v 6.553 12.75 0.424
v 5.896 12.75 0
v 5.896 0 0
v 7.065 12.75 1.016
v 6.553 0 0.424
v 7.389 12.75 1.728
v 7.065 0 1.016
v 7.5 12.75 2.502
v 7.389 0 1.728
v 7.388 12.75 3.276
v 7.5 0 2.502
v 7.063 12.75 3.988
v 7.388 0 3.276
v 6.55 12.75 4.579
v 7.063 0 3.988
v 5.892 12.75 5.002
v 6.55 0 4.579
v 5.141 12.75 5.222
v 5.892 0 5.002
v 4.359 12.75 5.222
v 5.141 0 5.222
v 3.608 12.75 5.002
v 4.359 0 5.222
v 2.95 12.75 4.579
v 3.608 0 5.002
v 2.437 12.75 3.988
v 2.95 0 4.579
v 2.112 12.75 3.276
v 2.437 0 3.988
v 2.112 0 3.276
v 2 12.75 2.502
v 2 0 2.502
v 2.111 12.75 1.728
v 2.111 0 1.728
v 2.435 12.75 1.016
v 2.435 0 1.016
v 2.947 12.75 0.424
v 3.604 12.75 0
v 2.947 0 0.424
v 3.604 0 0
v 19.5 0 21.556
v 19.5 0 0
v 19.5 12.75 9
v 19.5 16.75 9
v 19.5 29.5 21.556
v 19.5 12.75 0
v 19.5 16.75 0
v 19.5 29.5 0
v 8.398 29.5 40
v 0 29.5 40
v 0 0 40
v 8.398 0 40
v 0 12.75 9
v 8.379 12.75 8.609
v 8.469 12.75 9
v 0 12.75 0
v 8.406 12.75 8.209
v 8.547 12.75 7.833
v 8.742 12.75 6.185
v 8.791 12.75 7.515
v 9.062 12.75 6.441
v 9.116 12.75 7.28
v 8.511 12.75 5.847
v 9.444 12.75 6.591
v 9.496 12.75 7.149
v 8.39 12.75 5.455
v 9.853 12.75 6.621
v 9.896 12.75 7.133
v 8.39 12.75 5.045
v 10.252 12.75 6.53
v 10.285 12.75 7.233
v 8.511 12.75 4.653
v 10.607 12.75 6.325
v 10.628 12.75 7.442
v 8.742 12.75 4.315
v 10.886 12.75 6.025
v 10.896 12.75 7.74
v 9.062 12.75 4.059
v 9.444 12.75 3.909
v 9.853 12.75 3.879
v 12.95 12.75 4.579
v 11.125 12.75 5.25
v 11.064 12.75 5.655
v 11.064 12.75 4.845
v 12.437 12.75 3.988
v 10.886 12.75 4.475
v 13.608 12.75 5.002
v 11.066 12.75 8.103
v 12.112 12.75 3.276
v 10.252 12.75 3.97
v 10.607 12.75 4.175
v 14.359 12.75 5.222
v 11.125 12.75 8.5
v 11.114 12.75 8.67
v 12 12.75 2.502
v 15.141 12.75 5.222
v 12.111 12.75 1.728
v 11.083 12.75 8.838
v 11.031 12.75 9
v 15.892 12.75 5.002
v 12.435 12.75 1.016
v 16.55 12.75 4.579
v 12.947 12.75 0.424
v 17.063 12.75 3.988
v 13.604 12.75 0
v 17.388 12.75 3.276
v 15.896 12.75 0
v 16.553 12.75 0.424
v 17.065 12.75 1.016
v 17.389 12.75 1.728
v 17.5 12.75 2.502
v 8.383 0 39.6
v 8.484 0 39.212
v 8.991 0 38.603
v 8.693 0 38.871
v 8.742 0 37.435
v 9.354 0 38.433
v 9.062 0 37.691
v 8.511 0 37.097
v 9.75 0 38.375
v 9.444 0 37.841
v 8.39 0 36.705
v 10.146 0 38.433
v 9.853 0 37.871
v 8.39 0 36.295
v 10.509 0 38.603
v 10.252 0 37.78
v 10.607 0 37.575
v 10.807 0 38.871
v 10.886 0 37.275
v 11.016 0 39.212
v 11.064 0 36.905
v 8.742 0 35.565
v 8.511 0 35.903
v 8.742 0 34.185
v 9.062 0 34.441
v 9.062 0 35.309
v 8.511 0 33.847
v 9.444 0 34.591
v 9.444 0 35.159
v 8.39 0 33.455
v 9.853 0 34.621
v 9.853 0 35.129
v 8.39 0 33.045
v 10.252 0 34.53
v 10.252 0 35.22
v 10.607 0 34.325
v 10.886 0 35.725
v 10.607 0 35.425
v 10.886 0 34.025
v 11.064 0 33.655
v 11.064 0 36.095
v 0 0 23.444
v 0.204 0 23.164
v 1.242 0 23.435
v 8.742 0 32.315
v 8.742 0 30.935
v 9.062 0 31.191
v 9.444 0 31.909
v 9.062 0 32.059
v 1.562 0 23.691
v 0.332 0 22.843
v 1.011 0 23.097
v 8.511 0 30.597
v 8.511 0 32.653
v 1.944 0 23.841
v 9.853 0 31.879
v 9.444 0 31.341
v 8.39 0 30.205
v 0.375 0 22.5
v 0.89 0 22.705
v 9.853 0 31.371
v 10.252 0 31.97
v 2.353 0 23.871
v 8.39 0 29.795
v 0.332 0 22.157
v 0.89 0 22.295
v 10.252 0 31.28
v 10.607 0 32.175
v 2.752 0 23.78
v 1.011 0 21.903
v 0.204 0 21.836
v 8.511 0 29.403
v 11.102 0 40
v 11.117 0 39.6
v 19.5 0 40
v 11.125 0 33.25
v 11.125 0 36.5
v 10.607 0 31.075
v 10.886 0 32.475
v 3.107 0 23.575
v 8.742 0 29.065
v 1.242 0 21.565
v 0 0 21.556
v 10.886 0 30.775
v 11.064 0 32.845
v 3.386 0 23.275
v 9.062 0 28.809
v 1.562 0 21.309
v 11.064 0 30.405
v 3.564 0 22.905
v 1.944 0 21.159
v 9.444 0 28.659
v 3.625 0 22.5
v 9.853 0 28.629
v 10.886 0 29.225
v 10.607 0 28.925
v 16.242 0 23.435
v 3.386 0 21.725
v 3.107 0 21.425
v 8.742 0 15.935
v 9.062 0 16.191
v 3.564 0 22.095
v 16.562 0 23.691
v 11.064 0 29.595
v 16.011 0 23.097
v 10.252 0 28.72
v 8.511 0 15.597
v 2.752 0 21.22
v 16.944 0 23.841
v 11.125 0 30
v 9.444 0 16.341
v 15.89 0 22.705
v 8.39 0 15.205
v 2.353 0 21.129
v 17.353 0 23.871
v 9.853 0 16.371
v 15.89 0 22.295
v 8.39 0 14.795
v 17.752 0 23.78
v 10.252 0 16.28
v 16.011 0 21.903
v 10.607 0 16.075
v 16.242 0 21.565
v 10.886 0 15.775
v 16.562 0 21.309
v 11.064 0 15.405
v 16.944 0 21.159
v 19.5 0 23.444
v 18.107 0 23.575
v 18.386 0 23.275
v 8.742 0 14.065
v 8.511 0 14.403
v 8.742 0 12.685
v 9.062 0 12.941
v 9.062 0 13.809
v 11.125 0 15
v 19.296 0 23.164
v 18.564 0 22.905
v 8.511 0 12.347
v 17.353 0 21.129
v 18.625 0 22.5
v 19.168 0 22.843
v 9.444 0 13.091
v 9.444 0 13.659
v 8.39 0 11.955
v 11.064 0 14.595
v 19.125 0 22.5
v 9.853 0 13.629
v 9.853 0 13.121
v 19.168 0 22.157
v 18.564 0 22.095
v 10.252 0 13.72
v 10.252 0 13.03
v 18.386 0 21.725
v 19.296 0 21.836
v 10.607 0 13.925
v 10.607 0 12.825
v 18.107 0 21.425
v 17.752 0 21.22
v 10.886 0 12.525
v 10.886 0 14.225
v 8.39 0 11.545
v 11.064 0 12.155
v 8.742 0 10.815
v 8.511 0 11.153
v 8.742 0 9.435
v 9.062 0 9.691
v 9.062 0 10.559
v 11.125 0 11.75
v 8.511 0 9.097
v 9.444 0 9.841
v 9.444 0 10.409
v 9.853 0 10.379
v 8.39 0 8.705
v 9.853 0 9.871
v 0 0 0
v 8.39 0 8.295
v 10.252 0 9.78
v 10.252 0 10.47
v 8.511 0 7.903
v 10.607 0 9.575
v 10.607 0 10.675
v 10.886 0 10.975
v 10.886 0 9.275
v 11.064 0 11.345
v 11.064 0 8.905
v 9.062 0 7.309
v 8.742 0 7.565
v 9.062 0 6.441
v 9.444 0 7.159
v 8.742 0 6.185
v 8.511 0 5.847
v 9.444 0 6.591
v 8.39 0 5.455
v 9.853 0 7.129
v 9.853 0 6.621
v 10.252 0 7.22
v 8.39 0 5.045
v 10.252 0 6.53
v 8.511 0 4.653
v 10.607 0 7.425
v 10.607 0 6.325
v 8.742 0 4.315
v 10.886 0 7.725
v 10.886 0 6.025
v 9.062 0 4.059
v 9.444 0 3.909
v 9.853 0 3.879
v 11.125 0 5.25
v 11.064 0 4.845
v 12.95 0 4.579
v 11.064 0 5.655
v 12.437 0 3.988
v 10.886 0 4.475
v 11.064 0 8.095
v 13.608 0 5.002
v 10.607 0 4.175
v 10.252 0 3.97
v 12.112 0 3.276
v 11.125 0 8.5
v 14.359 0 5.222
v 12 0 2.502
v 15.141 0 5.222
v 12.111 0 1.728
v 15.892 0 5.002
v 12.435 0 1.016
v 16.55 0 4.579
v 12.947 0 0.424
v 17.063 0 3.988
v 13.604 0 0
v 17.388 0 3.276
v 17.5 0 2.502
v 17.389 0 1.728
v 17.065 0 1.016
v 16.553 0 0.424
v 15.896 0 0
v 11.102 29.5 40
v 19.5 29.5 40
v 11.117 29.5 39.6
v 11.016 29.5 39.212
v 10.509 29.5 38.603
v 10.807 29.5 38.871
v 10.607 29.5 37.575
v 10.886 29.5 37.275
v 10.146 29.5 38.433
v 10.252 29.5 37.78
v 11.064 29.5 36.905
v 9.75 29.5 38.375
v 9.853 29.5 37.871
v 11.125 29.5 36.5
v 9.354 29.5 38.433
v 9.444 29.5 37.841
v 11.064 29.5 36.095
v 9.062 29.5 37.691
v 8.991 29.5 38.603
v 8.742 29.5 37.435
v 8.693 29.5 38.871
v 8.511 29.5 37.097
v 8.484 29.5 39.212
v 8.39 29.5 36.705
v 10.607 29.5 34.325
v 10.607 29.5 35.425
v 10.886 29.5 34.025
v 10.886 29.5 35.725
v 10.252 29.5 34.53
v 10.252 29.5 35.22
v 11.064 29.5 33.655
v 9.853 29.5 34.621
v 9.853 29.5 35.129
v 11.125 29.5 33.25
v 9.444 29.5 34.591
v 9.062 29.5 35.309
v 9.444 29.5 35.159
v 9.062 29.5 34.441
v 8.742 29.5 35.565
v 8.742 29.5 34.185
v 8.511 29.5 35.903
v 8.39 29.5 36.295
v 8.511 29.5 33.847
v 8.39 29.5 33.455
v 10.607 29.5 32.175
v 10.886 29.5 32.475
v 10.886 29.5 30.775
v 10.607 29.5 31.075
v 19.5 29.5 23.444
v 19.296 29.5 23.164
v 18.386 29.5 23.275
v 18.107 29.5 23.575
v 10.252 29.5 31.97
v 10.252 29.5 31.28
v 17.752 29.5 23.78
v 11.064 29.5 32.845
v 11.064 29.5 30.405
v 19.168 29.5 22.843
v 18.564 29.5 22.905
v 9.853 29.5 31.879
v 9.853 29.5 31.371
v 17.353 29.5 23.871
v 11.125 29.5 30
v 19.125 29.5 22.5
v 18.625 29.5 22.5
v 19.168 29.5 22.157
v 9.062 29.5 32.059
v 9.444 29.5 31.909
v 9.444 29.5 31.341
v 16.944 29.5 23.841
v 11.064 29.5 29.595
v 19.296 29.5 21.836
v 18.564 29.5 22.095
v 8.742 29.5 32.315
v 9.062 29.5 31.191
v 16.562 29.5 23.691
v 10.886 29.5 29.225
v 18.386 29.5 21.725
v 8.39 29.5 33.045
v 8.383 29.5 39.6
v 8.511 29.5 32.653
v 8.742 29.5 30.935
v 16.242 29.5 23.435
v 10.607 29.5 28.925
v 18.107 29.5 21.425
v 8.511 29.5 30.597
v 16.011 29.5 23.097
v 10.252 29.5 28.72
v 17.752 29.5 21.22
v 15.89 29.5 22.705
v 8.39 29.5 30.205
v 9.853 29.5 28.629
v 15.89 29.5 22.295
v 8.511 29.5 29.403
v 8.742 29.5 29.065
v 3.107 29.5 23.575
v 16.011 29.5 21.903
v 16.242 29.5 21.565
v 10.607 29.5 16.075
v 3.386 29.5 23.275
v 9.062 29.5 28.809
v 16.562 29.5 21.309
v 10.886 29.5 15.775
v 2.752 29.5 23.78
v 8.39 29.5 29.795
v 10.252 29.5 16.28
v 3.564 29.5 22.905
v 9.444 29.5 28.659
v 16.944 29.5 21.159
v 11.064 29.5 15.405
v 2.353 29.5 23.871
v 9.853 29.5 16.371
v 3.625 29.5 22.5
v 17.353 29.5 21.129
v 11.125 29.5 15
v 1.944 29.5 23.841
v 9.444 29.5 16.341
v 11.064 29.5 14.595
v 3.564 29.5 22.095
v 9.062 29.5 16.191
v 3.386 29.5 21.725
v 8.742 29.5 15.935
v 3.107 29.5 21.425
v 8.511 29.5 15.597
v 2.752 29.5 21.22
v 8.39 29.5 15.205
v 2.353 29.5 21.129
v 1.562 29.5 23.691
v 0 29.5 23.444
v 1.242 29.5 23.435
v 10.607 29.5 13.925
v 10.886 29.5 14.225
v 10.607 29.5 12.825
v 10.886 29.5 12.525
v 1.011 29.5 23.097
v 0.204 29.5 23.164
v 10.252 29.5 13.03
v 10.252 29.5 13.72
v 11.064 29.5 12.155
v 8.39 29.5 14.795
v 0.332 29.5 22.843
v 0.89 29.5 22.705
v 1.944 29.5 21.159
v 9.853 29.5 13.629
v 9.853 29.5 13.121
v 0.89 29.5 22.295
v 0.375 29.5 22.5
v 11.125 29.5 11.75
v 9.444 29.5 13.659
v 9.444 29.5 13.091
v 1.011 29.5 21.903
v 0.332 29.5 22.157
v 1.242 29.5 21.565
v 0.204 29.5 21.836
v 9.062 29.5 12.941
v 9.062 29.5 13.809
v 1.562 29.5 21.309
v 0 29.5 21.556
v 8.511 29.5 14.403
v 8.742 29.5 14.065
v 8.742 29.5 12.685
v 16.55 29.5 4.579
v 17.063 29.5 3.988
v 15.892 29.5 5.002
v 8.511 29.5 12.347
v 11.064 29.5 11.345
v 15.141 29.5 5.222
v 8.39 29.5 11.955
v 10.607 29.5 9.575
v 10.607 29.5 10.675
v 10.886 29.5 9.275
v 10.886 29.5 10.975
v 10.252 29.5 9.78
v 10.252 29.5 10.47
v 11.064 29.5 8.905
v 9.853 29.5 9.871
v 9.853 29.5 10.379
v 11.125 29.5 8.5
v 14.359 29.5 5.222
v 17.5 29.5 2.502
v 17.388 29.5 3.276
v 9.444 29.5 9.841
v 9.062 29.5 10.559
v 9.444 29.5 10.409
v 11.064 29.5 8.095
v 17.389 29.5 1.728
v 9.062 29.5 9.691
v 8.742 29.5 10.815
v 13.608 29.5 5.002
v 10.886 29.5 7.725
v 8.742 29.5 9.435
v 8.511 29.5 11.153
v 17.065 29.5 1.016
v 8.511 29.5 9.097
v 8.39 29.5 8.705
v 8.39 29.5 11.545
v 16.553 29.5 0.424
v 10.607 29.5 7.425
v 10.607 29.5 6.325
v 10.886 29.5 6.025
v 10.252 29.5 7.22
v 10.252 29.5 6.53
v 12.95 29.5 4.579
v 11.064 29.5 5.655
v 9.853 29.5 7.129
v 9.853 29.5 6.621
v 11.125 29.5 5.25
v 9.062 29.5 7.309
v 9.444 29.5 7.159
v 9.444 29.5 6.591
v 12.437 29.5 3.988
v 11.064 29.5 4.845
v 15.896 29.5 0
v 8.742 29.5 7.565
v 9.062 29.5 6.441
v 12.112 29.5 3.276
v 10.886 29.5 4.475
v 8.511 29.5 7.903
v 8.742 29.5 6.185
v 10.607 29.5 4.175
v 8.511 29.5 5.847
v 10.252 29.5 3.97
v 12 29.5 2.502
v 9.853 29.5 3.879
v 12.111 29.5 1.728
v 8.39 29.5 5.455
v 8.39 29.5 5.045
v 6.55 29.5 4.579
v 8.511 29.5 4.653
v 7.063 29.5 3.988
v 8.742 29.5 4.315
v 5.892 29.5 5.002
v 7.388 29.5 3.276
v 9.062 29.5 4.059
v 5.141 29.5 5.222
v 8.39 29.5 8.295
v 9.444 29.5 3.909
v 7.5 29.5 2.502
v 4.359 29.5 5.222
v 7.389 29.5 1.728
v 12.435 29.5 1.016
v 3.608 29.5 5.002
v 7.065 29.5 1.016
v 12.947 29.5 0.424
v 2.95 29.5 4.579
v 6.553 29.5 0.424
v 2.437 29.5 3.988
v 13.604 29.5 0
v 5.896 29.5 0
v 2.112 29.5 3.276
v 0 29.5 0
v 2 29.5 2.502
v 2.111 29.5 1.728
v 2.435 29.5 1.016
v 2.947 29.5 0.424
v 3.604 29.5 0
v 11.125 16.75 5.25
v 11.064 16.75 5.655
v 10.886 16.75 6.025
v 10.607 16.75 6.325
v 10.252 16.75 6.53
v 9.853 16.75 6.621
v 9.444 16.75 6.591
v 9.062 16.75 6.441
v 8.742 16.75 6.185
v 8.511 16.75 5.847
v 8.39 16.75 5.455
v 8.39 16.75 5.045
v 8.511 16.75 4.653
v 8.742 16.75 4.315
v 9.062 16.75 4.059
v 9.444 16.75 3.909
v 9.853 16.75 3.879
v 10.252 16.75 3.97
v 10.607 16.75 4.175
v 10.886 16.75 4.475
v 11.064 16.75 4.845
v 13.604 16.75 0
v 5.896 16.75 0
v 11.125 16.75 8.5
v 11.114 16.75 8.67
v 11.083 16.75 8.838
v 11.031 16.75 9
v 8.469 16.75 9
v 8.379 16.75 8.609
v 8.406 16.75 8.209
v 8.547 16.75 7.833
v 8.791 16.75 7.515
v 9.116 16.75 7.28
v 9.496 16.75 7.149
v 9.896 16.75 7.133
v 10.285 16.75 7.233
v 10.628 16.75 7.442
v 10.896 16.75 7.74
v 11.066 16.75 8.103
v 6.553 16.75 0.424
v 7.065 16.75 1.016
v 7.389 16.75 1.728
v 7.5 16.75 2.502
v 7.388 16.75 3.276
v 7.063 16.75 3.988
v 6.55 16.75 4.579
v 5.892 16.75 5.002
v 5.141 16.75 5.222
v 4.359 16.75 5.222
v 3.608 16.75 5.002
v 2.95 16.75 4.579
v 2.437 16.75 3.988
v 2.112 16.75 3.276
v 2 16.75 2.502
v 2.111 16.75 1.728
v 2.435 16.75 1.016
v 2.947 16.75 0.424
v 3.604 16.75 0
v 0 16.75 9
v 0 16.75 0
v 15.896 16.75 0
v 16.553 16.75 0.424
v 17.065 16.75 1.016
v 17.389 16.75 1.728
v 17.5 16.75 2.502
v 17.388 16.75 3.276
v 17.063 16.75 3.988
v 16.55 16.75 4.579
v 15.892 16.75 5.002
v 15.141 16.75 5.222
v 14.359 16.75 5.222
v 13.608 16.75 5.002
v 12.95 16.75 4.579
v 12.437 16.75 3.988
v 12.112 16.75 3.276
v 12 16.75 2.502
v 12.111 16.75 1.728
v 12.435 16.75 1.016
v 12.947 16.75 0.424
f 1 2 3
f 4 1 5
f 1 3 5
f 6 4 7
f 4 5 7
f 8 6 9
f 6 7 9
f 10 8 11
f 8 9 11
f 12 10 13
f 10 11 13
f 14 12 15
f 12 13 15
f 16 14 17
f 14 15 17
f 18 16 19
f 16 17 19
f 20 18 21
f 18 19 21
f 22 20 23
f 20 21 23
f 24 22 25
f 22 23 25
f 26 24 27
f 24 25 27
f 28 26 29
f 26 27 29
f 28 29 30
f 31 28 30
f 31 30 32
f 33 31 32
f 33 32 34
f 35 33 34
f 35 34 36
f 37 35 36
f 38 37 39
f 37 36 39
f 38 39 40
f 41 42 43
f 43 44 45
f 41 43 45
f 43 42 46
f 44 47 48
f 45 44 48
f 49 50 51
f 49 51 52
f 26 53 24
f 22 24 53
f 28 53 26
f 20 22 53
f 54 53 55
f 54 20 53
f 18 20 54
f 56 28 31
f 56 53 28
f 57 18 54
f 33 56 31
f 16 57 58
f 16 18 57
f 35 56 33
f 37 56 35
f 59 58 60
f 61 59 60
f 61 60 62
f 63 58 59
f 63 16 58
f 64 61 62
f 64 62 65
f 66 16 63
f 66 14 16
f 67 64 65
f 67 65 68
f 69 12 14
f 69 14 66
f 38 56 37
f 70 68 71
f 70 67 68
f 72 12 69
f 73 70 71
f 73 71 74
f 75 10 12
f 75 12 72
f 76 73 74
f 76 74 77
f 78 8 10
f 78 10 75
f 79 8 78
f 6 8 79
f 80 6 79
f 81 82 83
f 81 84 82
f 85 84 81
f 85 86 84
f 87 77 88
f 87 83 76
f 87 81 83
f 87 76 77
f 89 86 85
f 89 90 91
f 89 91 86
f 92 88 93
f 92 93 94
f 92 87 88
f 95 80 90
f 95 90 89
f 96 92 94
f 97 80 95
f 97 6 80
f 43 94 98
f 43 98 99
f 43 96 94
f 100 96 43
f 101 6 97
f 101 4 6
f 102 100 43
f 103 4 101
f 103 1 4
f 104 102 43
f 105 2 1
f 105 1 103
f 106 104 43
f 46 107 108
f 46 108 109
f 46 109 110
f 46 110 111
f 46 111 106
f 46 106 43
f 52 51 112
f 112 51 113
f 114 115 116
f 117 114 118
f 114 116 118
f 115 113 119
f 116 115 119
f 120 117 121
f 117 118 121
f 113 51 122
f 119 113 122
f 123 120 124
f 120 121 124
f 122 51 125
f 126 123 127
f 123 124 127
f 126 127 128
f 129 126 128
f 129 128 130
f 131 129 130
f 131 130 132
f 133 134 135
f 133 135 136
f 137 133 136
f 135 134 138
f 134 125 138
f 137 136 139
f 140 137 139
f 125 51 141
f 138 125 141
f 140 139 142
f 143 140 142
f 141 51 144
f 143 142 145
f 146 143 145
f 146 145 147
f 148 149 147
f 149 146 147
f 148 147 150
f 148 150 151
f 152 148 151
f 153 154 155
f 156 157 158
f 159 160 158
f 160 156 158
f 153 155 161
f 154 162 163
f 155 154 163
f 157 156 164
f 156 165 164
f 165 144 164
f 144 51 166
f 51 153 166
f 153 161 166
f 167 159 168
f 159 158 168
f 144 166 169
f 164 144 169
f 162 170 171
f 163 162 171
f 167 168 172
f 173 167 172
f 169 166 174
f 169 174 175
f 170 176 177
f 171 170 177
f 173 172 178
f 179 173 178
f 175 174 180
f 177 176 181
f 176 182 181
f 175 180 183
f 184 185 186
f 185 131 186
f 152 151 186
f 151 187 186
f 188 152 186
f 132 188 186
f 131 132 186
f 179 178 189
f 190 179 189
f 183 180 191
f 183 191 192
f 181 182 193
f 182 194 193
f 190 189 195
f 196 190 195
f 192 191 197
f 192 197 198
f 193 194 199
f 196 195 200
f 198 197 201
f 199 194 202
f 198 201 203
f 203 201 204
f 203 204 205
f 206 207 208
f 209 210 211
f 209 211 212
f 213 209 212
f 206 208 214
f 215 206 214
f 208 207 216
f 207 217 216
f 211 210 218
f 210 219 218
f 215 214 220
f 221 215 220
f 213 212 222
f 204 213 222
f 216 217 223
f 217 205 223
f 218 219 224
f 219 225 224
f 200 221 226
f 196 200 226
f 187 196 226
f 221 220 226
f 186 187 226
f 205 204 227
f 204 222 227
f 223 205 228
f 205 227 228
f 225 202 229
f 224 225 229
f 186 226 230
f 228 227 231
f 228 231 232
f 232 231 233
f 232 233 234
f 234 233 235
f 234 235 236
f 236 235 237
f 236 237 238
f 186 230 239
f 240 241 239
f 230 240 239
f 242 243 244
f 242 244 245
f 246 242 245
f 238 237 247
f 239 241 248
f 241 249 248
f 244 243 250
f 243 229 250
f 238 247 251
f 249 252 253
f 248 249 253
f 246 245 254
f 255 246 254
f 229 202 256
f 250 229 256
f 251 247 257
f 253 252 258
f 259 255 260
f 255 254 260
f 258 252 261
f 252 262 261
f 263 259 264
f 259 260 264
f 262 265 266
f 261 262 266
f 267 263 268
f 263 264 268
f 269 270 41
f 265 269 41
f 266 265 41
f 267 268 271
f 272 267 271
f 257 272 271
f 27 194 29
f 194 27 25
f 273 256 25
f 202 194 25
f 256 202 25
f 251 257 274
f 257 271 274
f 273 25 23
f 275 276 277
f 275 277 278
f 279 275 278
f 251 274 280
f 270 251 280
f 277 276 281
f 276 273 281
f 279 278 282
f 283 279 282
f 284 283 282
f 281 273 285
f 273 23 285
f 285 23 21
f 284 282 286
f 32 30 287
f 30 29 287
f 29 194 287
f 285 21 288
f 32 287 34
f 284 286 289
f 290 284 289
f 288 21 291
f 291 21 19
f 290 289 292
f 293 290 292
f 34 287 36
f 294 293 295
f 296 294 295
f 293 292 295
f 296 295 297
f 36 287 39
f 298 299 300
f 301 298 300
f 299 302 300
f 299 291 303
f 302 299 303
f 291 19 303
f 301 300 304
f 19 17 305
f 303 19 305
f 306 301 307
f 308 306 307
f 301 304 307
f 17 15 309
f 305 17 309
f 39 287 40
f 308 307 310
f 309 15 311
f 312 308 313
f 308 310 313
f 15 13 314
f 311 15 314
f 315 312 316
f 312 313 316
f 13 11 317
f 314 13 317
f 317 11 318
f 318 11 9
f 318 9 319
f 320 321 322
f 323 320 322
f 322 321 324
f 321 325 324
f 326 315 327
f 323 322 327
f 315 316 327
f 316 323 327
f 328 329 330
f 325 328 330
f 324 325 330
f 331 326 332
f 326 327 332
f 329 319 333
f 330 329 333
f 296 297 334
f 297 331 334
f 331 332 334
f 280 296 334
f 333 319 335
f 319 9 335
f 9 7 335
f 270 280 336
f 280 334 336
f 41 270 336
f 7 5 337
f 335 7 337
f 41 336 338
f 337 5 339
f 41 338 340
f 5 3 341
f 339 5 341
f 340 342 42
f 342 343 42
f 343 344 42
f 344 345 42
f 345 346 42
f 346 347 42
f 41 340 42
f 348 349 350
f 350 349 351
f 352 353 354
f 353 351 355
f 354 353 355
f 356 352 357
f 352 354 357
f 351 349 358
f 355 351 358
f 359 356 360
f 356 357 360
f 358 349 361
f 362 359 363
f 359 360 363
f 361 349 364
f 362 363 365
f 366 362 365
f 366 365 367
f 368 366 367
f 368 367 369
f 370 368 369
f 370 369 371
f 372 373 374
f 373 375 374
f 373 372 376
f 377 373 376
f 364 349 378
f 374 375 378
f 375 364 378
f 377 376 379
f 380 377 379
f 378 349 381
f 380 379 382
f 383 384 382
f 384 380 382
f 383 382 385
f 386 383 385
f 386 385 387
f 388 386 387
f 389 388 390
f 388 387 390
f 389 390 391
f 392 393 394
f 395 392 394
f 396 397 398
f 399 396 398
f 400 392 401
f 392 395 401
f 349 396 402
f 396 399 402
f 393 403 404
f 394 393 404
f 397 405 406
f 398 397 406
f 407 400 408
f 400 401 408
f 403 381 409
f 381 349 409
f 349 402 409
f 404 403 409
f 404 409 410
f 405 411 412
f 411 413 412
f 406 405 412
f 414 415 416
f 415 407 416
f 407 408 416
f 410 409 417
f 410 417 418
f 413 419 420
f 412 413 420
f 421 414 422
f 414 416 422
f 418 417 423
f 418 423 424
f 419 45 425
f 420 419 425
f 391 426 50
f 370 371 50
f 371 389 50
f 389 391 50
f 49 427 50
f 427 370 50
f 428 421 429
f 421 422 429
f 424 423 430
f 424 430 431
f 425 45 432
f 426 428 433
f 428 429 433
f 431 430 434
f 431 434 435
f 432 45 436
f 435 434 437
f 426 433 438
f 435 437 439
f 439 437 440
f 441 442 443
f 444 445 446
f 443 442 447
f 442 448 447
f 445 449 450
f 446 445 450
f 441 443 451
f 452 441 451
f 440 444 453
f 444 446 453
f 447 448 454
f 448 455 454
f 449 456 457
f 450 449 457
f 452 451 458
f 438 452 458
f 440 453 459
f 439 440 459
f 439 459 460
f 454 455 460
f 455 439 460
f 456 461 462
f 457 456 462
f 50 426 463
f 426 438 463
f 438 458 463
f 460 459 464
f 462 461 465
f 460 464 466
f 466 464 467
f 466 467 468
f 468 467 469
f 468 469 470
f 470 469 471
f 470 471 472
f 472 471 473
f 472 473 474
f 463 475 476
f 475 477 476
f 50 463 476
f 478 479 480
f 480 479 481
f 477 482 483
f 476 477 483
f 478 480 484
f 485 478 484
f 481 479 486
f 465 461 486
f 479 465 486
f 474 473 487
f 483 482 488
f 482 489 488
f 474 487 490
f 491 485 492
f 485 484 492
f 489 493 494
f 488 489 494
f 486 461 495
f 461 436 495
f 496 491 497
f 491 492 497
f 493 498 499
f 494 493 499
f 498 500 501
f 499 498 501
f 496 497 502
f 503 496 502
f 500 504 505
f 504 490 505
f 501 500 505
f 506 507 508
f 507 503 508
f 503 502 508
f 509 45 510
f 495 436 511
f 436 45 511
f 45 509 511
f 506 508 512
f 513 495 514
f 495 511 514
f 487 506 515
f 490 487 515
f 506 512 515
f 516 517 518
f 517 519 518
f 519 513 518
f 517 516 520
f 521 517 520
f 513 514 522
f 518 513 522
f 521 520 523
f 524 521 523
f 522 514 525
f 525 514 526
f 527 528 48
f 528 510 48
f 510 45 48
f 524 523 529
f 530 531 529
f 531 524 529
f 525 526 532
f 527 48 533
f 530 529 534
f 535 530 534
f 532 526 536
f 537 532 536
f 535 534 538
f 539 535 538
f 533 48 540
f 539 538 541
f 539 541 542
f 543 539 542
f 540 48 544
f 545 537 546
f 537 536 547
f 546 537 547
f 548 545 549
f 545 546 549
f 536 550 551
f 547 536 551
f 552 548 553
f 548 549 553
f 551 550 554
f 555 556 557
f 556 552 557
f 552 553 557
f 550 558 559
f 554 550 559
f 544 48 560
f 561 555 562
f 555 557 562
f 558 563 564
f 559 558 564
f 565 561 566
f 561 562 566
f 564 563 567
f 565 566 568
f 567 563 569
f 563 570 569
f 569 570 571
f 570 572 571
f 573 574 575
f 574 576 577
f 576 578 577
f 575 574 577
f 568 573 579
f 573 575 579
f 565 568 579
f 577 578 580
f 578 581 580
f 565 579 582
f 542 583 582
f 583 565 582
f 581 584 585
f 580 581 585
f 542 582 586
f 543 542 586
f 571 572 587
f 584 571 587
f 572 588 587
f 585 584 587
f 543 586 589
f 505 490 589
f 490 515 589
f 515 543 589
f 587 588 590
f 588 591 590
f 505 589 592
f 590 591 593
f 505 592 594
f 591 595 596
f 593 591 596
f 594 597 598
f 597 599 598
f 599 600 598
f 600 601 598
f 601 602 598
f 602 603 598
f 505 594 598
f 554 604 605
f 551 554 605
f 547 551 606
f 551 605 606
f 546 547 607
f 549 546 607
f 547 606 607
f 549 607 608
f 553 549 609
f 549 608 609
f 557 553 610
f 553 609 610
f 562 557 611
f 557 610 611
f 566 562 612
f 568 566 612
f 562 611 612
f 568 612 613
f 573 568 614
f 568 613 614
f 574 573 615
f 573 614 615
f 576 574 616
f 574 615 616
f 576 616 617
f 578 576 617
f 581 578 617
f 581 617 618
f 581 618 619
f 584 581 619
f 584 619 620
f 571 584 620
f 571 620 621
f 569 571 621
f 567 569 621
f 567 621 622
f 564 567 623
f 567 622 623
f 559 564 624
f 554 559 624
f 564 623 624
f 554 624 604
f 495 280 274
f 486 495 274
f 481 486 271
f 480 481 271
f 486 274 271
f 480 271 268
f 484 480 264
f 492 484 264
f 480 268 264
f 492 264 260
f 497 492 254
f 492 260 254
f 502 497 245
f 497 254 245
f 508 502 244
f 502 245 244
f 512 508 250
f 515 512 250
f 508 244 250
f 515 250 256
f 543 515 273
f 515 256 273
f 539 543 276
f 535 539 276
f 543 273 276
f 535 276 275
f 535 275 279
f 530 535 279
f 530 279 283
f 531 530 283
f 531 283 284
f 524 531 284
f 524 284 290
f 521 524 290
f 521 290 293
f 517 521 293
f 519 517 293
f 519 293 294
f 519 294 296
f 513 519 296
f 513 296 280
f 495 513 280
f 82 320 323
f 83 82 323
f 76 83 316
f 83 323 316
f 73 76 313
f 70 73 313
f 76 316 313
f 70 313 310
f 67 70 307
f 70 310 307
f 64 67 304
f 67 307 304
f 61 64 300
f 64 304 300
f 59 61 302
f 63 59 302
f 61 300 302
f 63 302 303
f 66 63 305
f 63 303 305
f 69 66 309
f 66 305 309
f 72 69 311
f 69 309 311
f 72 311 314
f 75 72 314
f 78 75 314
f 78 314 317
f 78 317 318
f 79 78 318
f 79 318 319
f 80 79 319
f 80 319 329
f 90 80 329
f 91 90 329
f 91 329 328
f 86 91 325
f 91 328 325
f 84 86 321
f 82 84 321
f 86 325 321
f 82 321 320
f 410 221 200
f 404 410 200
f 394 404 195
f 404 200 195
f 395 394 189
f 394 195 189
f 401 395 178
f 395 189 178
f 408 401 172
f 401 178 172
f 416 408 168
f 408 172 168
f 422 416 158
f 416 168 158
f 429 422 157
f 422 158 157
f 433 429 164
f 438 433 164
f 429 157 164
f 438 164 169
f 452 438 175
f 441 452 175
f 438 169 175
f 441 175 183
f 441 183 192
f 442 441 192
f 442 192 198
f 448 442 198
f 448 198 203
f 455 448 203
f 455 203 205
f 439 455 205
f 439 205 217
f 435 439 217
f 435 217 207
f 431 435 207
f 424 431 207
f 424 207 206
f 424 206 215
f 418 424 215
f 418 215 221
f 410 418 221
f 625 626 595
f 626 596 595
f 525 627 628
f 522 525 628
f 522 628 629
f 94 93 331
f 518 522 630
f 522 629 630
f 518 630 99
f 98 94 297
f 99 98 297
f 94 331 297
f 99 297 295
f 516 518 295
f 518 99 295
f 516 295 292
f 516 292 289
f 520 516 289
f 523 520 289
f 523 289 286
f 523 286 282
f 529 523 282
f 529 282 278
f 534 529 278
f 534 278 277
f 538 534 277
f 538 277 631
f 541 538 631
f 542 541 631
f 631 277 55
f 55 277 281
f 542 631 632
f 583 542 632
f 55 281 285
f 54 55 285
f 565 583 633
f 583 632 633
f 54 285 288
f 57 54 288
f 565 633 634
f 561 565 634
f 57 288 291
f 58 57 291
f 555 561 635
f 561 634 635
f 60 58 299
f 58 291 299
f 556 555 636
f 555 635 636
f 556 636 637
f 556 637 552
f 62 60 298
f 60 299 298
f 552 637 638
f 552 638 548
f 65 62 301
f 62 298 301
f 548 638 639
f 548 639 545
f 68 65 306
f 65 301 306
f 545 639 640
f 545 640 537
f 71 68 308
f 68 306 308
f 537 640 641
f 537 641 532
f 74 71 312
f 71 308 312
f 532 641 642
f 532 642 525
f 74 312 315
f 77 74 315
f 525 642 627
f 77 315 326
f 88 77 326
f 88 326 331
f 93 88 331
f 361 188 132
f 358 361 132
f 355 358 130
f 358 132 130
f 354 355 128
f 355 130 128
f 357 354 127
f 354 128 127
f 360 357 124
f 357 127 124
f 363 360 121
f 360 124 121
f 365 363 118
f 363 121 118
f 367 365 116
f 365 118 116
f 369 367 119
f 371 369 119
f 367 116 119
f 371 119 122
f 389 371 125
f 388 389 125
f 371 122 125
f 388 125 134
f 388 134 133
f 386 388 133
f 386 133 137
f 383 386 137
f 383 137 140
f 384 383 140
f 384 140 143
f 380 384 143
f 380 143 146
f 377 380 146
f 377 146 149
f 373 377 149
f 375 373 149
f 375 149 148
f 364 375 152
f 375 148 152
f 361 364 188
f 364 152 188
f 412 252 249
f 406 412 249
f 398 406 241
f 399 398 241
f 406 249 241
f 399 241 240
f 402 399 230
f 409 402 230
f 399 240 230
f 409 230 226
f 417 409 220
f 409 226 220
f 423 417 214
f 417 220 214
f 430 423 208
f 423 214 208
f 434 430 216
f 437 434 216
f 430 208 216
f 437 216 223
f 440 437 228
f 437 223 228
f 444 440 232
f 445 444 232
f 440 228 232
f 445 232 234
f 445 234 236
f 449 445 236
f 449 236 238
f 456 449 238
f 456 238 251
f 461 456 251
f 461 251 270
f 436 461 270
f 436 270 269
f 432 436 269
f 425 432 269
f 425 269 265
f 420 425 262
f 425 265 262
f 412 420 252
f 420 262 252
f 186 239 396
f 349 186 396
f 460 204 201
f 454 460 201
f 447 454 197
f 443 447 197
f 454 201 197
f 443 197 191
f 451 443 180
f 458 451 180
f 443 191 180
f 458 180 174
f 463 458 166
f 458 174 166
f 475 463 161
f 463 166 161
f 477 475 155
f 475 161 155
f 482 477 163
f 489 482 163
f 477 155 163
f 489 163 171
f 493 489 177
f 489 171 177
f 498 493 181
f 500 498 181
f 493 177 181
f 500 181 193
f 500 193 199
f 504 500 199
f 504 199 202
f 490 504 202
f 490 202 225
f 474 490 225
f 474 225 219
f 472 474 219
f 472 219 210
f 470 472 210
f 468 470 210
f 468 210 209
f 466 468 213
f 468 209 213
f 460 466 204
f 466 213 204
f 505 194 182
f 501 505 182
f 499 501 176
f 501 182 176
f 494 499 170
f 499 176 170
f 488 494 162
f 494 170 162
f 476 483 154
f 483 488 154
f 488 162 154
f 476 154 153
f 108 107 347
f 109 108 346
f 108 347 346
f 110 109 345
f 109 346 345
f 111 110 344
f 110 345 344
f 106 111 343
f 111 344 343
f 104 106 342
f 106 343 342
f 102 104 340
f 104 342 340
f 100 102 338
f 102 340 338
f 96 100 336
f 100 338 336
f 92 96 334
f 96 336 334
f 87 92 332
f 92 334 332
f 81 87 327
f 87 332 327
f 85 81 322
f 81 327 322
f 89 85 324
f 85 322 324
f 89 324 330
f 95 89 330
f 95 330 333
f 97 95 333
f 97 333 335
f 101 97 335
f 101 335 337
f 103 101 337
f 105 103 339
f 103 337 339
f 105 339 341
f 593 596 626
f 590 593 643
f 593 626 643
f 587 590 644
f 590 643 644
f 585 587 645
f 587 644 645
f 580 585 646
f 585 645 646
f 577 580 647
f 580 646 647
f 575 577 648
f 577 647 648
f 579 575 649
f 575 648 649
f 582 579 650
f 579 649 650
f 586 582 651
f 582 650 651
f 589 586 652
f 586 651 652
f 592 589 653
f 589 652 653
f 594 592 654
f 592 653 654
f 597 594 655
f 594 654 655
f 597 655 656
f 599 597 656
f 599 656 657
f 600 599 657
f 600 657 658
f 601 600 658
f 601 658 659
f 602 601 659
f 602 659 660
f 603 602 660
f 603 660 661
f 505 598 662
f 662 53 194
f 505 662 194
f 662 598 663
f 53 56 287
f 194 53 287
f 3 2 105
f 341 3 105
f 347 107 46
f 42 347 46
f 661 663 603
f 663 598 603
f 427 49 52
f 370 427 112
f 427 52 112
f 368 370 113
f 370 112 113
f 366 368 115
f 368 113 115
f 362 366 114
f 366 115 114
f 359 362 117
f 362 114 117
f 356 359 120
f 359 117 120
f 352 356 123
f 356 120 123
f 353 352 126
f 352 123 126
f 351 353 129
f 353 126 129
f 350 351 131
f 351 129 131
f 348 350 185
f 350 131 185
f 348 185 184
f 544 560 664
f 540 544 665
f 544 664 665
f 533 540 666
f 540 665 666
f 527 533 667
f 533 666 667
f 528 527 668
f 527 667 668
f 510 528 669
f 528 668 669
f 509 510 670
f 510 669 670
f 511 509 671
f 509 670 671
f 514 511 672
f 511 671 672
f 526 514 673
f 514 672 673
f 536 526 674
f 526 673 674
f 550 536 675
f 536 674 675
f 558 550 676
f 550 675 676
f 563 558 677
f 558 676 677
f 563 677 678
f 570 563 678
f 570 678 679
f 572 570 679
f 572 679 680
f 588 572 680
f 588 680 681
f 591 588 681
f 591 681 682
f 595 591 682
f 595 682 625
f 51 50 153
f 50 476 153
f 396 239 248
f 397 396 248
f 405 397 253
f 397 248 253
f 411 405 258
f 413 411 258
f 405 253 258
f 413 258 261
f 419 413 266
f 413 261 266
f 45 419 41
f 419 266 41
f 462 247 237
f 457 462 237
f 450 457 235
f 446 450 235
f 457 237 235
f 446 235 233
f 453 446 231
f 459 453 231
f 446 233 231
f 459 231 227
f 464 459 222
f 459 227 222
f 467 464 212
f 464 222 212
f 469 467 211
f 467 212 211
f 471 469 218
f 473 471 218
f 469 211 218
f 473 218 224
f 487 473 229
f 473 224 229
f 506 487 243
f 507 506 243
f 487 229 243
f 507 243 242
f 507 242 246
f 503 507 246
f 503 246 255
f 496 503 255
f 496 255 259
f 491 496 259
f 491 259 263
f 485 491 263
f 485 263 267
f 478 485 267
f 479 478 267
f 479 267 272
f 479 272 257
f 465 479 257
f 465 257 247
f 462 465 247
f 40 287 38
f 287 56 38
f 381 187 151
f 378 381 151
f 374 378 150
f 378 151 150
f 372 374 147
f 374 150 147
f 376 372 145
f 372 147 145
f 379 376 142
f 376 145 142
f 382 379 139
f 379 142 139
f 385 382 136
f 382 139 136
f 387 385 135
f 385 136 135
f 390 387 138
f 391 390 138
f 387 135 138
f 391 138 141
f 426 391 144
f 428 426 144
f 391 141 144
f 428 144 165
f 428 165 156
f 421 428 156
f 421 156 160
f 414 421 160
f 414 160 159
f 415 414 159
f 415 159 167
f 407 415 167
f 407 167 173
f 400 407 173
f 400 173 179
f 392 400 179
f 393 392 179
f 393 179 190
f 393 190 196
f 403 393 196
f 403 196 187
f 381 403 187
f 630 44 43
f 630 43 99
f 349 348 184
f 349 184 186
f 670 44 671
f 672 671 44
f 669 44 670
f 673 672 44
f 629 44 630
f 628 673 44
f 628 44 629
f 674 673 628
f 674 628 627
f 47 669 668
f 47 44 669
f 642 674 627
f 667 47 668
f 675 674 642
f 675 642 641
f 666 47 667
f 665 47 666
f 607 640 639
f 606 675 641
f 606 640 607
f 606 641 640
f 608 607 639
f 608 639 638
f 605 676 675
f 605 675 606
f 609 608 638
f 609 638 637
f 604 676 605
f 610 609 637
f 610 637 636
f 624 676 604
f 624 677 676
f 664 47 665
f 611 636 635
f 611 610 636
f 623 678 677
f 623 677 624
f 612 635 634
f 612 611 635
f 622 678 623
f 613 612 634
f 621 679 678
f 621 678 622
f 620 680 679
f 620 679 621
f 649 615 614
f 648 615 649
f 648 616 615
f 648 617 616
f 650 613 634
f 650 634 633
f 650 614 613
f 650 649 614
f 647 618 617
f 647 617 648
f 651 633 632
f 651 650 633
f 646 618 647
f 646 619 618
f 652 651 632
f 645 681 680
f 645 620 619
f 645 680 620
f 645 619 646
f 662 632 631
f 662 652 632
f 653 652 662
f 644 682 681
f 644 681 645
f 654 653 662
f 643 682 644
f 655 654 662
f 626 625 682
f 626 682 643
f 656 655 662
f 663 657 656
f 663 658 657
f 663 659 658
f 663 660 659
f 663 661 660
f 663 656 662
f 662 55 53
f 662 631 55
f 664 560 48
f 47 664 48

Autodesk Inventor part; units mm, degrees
ref_plane "YZ Plane" through (0, 0, 0) normal (1, 0, 0) x (0, 1, 0)
ref_plane "XZ Plane" through (0, 0, 0) normal (0, 1, 0) x (-1, 0, 0)
ref_plane "XY Plane" through (0, 0, 0) normal (0, 0, 1) x (1, 0, 0)
sketch "Sketch1" plane through (0, 0, 0) normal (0, 0, 1) x (1, 0, 0)
  line L0 (0, 0) -> (19.5, 0)
  line L1 (19.5, 0) -> (19.5, 29.5)
  line L2 (19.5, 29.5) -> (0, 29.5)
  line L3 (0, 29.5) -> (0, 0)
  dimension "d0" = 19.5
  dimension "d1" = 29.5
extrude "Extrusion1" add sketch "Sketch1" along normal blind 40
sketch "Sketch2" plane through (0, 0, 0) normal (0, -1, 0) x (1, 0, 0)
  line L0 (0, 0) -> (19.5, 0) projected
  line L1 (9.75, 0) -> (9.75, 2.5)
  line L2 (9.75, 2.5) -> (14.75, 2.5)
  line L3 (14.75, 2.5) -> (4.75, 2.5)
  circle A0 centre (4.75, 2.5) radius 2.75
  circle A1 centre (14.75, 2.5) radius 2.75
  dimension "d4" = 2.5
  dimension "d5" = 5
  dimension "d6" = 10
  dimension "d7" = 5.5
  dimension "d8" = 5.5
extrude "Extrusion2" cut sketch "Sketch2" against normal through all contours A0 L0 | L0 A0 | A1 L0 | L0 A1
sketch "Sketch3" plane through (0, 0, 0) normal (0, 0, -1) x (-1, 0, 0)
  line L0 (0, 29.5) -> (0, 0) projected
  line L1 (0, 14.75) -> (-19.5, 14.75)
  line L2 (-19.5, 0) -> (-19.5, 29.5) projected
  line L3 (-19.5, 14.75) -> (-19.5, 12.75)
  line L4 (-19.5, 12.75) -> (-19.5, 16.75)
  line L5 (-19.5, 16.75) -> (0, 16.75)
  line L6 (0, 16.75) -> (0, 12.75)
  line L7 (0, 12.75) -> (-19.5, 12.75)
  dimension "d11" = 2
  dimension "d12" = 4
extrude "Extrusion3" cut sketch "Sketch3" against normal blind 9
sketch "Sketch4" plane through (0, 0, 40) normal (0, -1, 0) x (1, 0, 0)
  line L0 (19.5, 0) -> (0, 0) projected
  line L1 (9.75, 0) -> (9.75, -17.5)
  line L2 (9.75, -17.5) -> (9.75, -10)
  circle A0 centre (9.75, -10) radius 1.375
  circle A1 centre (9.75, -6.75) radius 1.375
  circle A2 centre (9.75, -3.5) radius 1.375
  circle A3 centre (9.75, -0.25) radius 1.375
  circle A4 centre (2.25, -17.5) radius 1.375
  circle A5 centre (-1, -17.5) radius 1.375
  circle A6 centre (-4.25, -17.5) radius 1.375
  circle A7 centre (-7.5, -17.5) radius 1.375
  circle A8 centre (9.75, -25) radius 1.375
  circle A9 centre (9.75, -28.25) radius 1.375
  circle A10 centre (9.75, -31.5) radius 1.375
  circle A11 centre (9.75, -34.75) radius 1.375
  circle A12 centre (17.25, -17.5) radius 1.375
  circle A13 centre (20.5, -17.5) radius 1.375
  circle A14 centre (23.75, -17.5) radius 1.375
  circle A15 centre (27, -17.5) radius 1.375
  point P0 (0, -40)
  dimension "d15" = 17.5
  dimension "d16" = 7.5
  dimension "d17" = 2.75
  dimension "d20" = 3.25
  dimension "d27" = 360
extrude "Extrusion4" cut sketch "Sketch4" against normal through all
properties part number "wirst fix"
